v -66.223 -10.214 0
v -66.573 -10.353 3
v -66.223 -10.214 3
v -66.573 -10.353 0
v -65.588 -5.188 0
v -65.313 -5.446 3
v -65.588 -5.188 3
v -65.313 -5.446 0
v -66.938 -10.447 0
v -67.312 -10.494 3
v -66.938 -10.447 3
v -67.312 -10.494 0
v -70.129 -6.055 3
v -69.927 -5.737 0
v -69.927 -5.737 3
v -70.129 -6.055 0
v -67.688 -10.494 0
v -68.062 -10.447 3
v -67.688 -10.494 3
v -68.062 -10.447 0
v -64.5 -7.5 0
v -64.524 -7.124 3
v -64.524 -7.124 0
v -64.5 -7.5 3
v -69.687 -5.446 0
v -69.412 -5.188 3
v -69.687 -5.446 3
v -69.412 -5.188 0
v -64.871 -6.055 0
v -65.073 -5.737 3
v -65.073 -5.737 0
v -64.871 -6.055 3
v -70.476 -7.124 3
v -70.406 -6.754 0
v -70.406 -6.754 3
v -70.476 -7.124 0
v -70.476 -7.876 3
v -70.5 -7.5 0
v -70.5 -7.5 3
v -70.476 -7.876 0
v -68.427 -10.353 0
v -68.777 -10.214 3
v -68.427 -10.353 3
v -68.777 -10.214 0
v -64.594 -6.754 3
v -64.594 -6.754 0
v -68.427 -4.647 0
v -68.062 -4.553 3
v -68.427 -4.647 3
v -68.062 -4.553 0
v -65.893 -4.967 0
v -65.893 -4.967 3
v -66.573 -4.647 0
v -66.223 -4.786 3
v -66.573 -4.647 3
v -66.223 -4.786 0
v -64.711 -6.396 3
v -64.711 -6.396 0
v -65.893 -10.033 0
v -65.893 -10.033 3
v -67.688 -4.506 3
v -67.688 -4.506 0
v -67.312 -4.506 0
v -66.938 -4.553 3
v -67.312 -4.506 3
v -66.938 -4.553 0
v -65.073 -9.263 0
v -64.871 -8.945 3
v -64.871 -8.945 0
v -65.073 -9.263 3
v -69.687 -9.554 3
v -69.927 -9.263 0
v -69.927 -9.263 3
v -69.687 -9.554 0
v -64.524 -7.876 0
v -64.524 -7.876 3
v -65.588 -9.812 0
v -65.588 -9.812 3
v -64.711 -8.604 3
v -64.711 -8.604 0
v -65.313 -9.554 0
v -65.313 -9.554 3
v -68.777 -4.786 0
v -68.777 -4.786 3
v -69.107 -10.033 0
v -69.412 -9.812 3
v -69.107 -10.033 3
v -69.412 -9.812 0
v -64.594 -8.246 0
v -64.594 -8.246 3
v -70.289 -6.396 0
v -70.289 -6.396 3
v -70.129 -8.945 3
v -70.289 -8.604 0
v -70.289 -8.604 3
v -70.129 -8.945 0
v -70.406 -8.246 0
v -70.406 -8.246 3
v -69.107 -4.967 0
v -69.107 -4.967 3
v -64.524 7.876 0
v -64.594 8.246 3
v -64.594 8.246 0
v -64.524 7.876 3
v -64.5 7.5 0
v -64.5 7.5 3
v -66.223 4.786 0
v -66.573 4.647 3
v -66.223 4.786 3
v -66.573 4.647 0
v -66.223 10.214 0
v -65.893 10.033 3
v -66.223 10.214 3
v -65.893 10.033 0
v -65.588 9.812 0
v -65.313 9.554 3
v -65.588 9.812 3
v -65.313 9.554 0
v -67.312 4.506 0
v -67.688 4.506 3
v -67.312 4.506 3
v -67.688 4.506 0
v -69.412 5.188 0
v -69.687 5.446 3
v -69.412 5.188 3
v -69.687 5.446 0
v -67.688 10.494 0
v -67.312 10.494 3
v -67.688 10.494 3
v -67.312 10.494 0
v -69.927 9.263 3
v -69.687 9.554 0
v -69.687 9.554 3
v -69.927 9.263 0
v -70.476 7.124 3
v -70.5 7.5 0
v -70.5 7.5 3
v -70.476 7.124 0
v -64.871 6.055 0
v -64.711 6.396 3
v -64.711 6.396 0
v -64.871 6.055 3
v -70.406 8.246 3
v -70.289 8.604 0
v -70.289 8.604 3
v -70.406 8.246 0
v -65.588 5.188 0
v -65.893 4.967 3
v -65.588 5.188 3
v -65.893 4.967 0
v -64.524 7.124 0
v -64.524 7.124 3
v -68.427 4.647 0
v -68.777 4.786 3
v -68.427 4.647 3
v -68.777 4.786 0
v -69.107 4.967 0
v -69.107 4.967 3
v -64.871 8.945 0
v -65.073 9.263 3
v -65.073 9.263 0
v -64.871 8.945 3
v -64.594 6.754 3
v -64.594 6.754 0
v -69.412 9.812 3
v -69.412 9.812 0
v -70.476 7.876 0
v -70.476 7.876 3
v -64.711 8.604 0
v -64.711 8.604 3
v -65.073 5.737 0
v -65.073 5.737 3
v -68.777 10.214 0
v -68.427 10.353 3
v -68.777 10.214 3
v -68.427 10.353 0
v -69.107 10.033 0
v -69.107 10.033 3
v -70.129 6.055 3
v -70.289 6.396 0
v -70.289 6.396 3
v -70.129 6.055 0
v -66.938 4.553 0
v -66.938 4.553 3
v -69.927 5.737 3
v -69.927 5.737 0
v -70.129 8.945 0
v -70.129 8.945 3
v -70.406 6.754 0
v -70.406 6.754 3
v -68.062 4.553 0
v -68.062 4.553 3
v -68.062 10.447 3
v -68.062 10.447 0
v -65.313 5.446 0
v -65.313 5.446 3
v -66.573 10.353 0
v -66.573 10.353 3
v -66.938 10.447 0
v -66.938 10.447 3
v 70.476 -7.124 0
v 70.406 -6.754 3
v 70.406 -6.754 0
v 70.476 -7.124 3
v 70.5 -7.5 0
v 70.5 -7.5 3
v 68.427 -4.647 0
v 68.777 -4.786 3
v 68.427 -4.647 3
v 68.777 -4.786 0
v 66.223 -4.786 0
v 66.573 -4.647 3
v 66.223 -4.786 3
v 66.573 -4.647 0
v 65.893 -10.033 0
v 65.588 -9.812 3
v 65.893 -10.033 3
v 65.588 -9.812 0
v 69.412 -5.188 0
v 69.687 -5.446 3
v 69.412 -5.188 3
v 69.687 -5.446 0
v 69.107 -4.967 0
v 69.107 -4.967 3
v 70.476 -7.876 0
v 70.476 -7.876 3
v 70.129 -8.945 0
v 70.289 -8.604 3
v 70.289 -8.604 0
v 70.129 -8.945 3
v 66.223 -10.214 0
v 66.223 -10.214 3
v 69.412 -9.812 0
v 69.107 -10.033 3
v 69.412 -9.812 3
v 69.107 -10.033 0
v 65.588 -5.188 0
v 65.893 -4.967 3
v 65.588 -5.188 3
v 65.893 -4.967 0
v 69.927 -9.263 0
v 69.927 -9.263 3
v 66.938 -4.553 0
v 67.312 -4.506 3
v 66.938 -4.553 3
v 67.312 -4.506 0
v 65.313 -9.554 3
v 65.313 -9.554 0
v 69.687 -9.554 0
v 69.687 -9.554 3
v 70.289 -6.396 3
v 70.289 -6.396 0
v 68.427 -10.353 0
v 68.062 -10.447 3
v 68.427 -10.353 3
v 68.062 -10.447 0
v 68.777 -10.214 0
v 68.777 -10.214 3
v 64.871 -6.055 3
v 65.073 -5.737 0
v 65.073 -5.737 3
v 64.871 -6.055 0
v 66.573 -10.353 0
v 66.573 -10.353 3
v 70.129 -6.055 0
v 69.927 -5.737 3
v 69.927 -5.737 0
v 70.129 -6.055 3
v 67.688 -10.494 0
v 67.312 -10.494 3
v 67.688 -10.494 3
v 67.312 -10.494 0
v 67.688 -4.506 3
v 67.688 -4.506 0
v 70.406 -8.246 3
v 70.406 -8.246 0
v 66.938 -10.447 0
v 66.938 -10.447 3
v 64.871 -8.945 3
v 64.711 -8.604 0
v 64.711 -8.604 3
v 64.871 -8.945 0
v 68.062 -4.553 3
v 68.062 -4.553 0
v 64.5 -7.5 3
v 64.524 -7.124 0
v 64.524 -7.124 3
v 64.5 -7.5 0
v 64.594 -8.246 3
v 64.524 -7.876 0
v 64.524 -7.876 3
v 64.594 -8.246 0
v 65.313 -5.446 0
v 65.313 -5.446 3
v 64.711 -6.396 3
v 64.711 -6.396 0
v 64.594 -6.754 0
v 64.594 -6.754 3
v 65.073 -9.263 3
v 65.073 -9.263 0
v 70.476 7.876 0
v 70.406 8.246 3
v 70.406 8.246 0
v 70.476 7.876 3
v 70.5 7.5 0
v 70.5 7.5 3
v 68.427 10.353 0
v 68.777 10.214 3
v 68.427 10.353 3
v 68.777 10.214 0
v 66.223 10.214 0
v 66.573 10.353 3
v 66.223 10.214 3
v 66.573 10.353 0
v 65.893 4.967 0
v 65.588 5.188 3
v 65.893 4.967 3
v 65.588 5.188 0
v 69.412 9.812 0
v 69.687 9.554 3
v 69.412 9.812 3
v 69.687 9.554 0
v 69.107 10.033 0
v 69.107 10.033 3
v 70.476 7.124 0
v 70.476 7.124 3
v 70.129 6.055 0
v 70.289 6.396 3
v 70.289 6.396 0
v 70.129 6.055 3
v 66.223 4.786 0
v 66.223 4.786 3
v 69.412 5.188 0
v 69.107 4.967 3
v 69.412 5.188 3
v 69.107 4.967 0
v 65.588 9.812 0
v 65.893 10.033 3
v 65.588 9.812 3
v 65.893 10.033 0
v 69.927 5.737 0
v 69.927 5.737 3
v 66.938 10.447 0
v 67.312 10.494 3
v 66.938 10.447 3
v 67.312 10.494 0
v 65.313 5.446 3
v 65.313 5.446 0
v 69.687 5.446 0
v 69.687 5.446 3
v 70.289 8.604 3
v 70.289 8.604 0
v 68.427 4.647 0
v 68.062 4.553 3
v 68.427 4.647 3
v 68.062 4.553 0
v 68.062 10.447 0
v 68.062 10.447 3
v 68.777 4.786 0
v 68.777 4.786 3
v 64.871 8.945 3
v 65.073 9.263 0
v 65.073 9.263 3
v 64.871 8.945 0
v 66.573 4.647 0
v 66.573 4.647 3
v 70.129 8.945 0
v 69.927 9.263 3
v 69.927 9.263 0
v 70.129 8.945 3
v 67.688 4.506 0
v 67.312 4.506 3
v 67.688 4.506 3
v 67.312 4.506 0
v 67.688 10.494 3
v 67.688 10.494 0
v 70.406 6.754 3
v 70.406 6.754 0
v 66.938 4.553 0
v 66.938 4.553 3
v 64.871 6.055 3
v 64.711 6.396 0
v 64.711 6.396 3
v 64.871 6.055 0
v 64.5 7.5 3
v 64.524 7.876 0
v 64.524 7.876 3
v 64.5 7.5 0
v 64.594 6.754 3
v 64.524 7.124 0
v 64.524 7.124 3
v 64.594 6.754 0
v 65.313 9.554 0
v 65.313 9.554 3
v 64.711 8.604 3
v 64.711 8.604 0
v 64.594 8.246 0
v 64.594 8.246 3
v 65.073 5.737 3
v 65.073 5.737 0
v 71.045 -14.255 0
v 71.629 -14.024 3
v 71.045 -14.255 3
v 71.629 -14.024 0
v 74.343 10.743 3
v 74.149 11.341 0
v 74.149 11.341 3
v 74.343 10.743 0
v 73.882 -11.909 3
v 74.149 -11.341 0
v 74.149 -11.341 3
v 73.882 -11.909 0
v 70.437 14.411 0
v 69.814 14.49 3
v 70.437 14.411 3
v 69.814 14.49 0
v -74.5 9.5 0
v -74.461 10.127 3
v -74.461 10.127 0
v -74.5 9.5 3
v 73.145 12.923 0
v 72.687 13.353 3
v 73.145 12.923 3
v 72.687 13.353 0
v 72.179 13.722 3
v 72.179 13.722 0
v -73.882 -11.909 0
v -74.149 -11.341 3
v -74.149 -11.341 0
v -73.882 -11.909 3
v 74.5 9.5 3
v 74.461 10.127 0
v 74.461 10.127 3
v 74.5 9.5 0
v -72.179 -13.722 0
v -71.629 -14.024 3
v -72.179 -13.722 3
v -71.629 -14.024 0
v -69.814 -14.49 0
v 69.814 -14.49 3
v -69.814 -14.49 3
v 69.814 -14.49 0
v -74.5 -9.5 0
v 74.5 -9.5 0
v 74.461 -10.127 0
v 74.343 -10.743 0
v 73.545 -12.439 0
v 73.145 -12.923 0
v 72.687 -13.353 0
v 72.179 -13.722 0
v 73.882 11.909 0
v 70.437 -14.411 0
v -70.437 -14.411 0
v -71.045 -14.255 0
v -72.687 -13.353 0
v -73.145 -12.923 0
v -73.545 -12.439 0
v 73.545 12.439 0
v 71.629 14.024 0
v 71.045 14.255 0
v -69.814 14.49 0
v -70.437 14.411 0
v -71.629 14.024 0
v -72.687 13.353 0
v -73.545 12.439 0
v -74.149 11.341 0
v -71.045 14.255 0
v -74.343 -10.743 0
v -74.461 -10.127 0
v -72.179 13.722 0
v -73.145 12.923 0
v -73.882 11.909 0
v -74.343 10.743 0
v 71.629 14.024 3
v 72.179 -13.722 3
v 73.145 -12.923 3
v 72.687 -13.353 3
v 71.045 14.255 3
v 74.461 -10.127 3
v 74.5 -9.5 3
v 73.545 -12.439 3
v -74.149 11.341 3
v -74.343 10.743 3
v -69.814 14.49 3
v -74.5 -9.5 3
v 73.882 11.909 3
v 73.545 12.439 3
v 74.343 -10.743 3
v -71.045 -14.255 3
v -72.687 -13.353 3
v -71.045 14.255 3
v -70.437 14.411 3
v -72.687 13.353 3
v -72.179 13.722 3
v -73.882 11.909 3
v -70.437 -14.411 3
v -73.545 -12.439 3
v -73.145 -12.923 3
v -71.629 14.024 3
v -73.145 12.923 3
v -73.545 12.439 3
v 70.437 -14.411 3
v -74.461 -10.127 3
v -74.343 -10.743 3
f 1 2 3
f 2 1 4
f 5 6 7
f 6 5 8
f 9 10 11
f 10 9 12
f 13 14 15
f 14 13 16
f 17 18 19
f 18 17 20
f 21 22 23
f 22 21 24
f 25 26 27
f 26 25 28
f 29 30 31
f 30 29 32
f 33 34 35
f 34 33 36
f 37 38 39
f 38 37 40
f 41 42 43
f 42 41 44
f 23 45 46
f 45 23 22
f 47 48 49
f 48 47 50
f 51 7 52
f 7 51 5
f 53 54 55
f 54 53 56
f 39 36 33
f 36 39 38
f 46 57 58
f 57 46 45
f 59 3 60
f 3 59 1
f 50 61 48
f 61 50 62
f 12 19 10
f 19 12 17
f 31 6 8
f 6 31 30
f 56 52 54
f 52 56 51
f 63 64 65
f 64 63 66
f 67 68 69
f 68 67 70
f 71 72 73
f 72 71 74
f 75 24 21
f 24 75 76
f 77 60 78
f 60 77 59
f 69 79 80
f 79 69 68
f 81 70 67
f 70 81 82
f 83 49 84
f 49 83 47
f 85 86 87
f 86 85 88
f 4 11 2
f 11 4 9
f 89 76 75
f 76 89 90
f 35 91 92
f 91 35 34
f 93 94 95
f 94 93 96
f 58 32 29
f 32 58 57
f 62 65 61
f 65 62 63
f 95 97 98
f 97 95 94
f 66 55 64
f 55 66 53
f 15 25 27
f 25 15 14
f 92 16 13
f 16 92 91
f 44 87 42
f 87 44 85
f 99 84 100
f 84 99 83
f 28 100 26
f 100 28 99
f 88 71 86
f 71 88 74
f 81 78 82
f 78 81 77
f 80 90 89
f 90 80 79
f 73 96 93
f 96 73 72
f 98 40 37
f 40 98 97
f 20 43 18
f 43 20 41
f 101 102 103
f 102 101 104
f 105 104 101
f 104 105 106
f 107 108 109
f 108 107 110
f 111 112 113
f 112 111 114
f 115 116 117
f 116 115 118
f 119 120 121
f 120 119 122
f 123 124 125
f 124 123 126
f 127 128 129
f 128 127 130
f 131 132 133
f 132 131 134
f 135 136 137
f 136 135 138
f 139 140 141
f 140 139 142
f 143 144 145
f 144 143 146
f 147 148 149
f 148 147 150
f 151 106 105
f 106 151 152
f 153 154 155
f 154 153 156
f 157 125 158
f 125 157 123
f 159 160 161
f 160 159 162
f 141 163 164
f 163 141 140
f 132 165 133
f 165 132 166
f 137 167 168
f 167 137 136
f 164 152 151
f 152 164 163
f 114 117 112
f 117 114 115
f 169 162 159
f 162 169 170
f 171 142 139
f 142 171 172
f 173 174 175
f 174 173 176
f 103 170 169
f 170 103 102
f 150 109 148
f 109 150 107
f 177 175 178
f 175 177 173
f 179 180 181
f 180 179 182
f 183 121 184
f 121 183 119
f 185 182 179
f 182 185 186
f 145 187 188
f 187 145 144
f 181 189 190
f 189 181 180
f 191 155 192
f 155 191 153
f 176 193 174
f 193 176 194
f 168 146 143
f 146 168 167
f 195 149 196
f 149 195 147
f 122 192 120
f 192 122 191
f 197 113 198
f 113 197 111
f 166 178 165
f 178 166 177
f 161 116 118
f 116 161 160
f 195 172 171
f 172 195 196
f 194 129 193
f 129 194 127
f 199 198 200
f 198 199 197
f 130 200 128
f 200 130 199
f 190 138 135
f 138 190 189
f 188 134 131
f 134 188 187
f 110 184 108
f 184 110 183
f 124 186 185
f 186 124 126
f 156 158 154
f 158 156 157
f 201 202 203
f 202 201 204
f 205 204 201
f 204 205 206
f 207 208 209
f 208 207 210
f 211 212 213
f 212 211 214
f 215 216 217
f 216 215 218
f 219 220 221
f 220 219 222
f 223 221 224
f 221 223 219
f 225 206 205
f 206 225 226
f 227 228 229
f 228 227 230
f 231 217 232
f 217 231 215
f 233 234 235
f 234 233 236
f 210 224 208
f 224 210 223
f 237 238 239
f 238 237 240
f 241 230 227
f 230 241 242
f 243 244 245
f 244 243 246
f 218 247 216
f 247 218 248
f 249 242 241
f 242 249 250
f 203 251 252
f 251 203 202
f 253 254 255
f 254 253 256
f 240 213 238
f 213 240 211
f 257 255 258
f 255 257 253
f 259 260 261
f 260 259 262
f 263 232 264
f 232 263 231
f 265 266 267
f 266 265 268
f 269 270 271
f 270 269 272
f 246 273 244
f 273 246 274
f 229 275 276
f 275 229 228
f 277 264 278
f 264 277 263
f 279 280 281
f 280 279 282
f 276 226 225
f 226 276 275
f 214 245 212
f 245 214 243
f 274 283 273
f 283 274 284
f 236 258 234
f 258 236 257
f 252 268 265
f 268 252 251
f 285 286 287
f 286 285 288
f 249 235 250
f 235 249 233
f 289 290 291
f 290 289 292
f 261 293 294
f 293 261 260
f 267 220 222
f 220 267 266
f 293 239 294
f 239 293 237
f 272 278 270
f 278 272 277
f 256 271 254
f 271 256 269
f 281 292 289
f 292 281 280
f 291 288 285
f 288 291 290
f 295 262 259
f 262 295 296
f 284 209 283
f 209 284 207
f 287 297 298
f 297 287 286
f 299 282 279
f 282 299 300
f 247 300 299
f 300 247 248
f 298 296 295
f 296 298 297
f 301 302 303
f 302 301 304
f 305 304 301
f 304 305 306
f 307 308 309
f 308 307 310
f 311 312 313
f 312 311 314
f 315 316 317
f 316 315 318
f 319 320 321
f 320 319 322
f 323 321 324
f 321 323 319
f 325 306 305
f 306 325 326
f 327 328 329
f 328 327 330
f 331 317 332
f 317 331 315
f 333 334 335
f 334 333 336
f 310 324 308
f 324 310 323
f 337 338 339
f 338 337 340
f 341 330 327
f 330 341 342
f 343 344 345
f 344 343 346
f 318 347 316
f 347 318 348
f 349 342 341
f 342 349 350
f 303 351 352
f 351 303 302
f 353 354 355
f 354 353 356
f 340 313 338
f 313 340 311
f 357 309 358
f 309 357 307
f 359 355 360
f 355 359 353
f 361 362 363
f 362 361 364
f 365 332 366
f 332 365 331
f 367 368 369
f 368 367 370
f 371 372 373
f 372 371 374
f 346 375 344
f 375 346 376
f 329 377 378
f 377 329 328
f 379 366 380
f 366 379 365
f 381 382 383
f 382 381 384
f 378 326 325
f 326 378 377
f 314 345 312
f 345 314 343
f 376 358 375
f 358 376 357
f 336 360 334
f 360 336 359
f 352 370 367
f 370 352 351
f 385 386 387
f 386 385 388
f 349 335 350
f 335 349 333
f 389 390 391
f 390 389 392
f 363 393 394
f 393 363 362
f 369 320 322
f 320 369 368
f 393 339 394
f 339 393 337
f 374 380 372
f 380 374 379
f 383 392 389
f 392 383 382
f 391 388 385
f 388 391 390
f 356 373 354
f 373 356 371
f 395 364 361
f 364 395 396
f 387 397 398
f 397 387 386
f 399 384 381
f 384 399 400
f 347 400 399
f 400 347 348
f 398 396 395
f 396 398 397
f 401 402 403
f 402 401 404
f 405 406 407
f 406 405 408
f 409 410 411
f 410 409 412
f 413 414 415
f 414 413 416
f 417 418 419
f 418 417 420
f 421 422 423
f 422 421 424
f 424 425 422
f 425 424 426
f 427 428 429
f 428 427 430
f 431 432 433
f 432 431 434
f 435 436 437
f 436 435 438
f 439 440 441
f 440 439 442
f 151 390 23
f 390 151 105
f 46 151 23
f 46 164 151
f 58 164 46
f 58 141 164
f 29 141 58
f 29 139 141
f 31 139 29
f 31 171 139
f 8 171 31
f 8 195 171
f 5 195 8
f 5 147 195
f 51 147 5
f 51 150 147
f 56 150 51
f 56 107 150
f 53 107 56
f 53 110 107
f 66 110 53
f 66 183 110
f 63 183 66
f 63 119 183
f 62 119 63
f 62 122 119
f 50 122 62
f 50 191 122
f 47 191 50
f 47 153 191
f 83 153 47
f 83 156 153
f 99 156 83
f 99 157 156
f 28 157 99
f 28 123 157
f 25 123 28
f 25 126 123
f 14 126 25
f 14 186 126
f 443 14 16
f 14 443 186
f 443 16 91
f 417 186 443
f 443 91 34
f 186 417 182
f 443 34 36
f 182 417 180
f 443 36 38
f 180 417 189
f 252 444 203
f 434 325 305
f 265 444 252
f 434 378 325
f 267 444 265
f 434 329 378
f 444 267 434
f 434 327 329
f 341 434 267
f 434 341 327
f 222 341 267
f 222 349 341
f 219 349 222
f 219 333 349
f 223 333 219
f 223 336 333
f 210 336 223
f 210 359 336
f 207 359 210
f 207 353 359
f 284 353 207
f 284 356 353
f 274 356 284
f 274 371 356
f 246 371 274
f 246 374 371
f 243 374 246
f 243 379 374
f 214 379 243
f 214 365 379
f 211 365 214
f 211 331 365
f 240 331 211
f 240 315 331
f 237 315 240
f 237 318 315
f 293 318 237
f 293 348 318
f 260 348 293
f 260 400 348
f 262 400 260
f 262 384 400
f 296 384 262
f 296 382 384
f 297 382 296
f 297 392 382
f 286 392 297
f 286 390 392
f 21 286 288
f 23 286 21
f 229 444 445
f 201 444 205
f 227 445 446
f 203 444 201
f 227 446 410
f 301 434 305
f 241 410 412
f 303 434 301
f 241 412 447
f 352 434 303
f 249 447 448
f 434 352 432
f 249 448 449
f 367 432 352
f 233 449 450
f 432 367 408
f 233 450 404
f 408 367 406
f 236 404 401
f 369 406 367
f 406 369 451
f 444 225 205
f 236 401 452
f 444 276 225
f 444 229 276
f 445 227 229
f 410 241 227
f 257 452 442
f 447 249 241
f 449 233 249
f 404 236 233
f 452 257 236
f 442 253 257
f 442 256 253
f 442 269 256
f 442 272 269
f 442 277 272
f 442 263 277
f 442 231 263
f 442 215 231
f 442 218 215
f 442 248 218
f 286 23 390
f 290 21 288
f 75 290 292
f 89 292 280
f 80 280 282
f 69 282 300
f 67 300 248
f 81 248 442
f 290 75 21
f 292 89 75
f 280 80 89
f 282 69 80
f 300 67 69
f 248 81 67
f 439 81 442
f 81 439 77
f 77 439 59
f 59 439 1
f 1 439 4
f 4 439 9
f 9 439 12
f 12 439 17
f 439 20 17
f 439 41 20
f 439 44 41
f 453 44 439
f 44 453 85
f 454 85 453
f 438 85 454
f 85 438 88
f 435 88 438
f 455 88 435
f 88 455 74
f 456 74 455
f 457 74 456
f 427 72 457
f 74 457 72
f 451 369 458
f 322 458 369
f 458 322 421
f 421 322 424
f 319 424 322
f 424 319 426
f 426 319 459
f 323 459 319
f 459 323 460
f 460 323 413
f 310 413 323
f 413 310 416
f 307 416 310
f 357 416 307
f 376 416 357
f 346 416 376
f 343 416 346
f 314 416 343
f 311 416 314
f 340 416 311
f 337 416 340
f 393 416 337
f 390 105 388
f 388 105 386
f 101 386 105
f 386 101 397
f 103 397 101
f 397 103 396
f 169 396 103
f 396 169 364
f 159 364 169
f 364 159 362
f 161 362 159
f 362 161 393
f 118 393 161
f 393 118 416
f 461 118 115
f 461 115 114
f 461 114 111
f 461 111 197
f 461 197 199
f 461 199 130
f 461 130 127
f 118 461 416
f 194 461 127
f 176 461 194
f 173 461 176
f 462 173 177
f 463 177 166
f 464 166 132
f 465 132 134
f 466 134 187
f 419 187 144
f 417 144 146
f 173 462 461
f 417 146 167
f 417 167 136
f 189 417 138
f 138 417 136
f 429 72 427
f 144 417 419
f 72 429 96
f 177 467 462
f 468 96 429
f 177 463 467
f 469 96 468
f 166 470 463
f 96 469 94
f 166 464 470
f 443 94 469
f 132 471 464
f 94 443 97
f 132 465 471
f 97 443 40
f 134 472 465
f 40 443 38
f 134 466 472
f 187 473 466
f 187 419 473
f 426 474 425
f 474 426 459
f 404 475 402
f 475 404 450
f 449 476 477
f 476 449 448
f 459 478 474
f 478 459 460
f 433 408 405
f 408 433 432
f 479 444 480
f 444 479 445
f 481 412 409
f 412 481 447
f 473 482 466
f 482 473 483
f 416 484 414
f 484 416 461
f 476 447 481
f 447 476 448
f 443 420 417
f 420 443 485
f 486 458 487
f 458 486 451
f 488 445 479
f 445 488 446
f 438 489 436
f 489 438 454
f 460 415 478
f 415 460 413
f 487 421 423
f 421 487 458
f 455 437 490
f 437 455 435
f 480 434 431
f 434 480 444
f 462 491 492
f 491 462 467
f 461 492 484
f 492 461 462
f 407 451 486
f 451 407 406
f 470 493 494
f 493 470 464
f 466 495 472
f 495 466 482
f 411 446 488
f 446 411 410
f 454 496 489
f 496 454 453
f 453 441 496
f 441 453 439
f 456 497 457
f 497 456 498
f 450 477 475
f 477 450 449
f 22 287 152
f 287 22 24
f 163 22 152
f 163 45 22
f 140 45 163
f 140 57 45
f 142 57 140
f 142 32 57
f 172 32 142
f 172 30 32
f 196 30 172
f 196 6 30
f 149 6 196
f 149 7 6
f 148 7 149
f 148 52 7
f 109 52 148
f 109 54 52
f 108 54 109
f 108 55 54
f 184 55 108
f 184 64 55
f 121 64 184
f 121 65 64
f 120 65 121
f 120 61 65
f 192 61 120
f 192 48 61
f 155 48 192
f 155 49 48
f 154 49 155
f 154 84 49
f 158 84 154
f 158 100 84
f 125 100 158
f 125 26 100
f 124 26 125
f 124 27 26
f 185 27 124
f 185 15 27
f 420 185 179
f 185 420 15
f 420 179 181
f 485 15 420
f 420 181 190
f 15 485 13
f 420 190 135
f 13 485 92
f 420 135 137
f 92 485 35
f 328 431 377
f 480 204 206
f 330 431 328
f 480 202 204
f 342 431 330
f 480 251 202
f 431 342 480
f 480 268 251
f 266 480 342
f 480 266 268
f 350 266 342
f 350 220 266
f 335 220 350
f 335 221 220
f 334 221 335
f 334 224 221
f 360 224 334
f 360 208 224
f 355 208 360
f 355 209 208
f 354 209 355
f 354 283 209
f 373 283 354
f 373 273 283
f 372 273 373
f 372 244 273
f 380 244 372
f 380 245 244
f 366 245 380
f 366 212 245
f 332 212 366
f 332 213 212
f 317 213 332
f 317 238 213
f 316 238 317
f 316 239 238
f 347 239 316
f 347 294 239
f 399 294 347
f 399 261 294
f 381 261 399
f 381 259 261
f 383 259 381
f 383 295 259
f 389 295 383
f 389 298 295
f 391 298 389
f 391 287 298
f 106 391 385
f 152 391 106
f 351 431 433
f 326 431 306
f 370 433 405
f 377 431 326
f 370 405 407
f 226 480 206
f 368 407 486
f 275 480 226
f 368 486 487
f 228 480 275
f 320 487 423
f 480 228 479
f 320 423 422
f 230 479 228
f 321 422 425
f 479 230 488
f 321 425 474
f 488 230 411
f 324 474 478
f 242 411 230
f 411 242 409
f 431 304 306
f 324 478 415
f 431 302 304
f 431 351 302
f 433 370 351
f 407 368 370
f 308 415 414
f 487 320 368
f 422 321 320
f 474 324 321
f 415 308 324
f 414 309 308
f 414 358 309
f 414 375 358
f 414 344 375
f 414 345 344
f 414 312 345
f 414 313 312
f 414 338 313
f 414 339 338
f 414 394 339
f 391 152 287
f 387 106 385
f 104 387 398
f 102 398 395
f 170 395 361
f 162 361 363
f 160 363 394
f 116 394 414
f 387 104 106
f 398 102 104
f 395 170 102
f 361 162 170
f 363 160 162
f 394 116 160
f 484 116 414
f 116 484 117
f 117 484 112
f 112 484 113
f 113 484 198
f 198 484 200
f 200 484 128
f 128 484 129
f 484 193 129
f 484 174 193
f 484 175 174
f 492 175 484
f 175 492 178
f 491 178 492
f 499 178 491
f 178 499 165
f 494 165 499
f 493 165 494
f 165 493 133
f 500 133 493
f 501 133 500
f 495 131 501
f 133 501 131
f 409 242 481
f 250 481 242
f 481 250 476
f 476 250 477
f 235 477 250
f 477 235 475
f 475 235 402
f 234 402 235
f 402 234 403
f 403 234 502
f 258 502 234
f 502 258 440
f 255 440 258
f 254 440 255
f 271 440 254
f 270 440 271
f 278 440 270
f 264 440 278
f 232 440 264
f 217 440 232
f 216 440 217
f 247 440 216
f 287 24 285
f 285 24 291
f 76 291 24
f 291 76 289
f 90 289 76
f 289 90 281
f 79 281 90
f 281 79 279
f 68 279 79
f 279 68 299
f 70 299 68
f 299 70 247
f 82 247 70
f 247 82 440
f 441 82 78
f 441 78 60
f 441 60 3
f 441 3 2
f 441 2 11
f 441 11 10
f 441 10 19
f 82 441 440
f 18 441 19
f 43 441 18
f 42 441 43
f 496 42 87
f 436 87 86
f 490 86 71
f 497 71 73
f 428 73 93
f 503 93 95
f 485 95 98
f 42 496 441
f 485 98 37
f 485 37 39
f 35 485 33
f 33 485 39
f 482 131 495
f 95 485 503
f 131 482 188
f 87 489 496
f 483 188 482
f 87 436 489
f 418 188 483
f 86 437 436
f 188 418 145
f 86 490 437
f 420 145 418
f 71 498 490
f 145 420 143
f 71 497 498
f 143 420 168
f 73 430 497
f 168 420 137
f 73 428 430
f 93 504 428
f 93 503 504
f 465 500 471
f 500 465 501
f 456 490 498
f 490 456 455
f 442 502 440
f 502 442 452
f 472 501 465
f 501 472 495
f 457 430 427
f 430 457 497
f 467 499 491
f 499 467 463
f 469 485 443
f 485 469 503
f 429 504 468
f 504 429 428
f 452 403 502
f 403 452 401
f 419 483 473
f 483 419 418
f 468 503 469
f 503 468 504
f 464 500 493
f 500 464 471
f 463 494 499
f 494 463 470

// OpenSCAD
$fn = 50;


difference() {
	union() {
		hull() {
			translate(v = [-69.5000000000, 9.5000000000, 0]) {
				cylinder(h = 3, r = 5);
			}
			translate(v = [69.5000000000, 9.5000000000, 0]) {
				cylinder(h = 3, r = 5);
			}
			translate(v = [-69.5000000000, -9.5000000000, 0]) {
				cylinder(h = 3, r = 5);
			}
			translate(v = [69.5000000000, -9.5000000000, 0]) {
				cylinder(h = 3, r = 5);
			}
		}
	}
	union() {
		translate(v = [-67.5000000000, -7.5000000000, -100.0000000000]) {
			cylinder(h = 200, r = 3.0000000000);
		}
		translate(v = [-67.5000000000, 7.5000000000, -100.0000000000]) {
			cylinder(h = 200, r = 3.0000000000);
		}
		translate(v = [67.5000000000, -7.5000000000, -100.0000000000]) {
			cylinder(h = 200, r = 3.0000000000);
		}
		translate(v = [67.5000000000, 7.5000000000, -100.0000000000]) {
			cylinder(h = 200, r = 3.0000000000);
		}
	}
}
